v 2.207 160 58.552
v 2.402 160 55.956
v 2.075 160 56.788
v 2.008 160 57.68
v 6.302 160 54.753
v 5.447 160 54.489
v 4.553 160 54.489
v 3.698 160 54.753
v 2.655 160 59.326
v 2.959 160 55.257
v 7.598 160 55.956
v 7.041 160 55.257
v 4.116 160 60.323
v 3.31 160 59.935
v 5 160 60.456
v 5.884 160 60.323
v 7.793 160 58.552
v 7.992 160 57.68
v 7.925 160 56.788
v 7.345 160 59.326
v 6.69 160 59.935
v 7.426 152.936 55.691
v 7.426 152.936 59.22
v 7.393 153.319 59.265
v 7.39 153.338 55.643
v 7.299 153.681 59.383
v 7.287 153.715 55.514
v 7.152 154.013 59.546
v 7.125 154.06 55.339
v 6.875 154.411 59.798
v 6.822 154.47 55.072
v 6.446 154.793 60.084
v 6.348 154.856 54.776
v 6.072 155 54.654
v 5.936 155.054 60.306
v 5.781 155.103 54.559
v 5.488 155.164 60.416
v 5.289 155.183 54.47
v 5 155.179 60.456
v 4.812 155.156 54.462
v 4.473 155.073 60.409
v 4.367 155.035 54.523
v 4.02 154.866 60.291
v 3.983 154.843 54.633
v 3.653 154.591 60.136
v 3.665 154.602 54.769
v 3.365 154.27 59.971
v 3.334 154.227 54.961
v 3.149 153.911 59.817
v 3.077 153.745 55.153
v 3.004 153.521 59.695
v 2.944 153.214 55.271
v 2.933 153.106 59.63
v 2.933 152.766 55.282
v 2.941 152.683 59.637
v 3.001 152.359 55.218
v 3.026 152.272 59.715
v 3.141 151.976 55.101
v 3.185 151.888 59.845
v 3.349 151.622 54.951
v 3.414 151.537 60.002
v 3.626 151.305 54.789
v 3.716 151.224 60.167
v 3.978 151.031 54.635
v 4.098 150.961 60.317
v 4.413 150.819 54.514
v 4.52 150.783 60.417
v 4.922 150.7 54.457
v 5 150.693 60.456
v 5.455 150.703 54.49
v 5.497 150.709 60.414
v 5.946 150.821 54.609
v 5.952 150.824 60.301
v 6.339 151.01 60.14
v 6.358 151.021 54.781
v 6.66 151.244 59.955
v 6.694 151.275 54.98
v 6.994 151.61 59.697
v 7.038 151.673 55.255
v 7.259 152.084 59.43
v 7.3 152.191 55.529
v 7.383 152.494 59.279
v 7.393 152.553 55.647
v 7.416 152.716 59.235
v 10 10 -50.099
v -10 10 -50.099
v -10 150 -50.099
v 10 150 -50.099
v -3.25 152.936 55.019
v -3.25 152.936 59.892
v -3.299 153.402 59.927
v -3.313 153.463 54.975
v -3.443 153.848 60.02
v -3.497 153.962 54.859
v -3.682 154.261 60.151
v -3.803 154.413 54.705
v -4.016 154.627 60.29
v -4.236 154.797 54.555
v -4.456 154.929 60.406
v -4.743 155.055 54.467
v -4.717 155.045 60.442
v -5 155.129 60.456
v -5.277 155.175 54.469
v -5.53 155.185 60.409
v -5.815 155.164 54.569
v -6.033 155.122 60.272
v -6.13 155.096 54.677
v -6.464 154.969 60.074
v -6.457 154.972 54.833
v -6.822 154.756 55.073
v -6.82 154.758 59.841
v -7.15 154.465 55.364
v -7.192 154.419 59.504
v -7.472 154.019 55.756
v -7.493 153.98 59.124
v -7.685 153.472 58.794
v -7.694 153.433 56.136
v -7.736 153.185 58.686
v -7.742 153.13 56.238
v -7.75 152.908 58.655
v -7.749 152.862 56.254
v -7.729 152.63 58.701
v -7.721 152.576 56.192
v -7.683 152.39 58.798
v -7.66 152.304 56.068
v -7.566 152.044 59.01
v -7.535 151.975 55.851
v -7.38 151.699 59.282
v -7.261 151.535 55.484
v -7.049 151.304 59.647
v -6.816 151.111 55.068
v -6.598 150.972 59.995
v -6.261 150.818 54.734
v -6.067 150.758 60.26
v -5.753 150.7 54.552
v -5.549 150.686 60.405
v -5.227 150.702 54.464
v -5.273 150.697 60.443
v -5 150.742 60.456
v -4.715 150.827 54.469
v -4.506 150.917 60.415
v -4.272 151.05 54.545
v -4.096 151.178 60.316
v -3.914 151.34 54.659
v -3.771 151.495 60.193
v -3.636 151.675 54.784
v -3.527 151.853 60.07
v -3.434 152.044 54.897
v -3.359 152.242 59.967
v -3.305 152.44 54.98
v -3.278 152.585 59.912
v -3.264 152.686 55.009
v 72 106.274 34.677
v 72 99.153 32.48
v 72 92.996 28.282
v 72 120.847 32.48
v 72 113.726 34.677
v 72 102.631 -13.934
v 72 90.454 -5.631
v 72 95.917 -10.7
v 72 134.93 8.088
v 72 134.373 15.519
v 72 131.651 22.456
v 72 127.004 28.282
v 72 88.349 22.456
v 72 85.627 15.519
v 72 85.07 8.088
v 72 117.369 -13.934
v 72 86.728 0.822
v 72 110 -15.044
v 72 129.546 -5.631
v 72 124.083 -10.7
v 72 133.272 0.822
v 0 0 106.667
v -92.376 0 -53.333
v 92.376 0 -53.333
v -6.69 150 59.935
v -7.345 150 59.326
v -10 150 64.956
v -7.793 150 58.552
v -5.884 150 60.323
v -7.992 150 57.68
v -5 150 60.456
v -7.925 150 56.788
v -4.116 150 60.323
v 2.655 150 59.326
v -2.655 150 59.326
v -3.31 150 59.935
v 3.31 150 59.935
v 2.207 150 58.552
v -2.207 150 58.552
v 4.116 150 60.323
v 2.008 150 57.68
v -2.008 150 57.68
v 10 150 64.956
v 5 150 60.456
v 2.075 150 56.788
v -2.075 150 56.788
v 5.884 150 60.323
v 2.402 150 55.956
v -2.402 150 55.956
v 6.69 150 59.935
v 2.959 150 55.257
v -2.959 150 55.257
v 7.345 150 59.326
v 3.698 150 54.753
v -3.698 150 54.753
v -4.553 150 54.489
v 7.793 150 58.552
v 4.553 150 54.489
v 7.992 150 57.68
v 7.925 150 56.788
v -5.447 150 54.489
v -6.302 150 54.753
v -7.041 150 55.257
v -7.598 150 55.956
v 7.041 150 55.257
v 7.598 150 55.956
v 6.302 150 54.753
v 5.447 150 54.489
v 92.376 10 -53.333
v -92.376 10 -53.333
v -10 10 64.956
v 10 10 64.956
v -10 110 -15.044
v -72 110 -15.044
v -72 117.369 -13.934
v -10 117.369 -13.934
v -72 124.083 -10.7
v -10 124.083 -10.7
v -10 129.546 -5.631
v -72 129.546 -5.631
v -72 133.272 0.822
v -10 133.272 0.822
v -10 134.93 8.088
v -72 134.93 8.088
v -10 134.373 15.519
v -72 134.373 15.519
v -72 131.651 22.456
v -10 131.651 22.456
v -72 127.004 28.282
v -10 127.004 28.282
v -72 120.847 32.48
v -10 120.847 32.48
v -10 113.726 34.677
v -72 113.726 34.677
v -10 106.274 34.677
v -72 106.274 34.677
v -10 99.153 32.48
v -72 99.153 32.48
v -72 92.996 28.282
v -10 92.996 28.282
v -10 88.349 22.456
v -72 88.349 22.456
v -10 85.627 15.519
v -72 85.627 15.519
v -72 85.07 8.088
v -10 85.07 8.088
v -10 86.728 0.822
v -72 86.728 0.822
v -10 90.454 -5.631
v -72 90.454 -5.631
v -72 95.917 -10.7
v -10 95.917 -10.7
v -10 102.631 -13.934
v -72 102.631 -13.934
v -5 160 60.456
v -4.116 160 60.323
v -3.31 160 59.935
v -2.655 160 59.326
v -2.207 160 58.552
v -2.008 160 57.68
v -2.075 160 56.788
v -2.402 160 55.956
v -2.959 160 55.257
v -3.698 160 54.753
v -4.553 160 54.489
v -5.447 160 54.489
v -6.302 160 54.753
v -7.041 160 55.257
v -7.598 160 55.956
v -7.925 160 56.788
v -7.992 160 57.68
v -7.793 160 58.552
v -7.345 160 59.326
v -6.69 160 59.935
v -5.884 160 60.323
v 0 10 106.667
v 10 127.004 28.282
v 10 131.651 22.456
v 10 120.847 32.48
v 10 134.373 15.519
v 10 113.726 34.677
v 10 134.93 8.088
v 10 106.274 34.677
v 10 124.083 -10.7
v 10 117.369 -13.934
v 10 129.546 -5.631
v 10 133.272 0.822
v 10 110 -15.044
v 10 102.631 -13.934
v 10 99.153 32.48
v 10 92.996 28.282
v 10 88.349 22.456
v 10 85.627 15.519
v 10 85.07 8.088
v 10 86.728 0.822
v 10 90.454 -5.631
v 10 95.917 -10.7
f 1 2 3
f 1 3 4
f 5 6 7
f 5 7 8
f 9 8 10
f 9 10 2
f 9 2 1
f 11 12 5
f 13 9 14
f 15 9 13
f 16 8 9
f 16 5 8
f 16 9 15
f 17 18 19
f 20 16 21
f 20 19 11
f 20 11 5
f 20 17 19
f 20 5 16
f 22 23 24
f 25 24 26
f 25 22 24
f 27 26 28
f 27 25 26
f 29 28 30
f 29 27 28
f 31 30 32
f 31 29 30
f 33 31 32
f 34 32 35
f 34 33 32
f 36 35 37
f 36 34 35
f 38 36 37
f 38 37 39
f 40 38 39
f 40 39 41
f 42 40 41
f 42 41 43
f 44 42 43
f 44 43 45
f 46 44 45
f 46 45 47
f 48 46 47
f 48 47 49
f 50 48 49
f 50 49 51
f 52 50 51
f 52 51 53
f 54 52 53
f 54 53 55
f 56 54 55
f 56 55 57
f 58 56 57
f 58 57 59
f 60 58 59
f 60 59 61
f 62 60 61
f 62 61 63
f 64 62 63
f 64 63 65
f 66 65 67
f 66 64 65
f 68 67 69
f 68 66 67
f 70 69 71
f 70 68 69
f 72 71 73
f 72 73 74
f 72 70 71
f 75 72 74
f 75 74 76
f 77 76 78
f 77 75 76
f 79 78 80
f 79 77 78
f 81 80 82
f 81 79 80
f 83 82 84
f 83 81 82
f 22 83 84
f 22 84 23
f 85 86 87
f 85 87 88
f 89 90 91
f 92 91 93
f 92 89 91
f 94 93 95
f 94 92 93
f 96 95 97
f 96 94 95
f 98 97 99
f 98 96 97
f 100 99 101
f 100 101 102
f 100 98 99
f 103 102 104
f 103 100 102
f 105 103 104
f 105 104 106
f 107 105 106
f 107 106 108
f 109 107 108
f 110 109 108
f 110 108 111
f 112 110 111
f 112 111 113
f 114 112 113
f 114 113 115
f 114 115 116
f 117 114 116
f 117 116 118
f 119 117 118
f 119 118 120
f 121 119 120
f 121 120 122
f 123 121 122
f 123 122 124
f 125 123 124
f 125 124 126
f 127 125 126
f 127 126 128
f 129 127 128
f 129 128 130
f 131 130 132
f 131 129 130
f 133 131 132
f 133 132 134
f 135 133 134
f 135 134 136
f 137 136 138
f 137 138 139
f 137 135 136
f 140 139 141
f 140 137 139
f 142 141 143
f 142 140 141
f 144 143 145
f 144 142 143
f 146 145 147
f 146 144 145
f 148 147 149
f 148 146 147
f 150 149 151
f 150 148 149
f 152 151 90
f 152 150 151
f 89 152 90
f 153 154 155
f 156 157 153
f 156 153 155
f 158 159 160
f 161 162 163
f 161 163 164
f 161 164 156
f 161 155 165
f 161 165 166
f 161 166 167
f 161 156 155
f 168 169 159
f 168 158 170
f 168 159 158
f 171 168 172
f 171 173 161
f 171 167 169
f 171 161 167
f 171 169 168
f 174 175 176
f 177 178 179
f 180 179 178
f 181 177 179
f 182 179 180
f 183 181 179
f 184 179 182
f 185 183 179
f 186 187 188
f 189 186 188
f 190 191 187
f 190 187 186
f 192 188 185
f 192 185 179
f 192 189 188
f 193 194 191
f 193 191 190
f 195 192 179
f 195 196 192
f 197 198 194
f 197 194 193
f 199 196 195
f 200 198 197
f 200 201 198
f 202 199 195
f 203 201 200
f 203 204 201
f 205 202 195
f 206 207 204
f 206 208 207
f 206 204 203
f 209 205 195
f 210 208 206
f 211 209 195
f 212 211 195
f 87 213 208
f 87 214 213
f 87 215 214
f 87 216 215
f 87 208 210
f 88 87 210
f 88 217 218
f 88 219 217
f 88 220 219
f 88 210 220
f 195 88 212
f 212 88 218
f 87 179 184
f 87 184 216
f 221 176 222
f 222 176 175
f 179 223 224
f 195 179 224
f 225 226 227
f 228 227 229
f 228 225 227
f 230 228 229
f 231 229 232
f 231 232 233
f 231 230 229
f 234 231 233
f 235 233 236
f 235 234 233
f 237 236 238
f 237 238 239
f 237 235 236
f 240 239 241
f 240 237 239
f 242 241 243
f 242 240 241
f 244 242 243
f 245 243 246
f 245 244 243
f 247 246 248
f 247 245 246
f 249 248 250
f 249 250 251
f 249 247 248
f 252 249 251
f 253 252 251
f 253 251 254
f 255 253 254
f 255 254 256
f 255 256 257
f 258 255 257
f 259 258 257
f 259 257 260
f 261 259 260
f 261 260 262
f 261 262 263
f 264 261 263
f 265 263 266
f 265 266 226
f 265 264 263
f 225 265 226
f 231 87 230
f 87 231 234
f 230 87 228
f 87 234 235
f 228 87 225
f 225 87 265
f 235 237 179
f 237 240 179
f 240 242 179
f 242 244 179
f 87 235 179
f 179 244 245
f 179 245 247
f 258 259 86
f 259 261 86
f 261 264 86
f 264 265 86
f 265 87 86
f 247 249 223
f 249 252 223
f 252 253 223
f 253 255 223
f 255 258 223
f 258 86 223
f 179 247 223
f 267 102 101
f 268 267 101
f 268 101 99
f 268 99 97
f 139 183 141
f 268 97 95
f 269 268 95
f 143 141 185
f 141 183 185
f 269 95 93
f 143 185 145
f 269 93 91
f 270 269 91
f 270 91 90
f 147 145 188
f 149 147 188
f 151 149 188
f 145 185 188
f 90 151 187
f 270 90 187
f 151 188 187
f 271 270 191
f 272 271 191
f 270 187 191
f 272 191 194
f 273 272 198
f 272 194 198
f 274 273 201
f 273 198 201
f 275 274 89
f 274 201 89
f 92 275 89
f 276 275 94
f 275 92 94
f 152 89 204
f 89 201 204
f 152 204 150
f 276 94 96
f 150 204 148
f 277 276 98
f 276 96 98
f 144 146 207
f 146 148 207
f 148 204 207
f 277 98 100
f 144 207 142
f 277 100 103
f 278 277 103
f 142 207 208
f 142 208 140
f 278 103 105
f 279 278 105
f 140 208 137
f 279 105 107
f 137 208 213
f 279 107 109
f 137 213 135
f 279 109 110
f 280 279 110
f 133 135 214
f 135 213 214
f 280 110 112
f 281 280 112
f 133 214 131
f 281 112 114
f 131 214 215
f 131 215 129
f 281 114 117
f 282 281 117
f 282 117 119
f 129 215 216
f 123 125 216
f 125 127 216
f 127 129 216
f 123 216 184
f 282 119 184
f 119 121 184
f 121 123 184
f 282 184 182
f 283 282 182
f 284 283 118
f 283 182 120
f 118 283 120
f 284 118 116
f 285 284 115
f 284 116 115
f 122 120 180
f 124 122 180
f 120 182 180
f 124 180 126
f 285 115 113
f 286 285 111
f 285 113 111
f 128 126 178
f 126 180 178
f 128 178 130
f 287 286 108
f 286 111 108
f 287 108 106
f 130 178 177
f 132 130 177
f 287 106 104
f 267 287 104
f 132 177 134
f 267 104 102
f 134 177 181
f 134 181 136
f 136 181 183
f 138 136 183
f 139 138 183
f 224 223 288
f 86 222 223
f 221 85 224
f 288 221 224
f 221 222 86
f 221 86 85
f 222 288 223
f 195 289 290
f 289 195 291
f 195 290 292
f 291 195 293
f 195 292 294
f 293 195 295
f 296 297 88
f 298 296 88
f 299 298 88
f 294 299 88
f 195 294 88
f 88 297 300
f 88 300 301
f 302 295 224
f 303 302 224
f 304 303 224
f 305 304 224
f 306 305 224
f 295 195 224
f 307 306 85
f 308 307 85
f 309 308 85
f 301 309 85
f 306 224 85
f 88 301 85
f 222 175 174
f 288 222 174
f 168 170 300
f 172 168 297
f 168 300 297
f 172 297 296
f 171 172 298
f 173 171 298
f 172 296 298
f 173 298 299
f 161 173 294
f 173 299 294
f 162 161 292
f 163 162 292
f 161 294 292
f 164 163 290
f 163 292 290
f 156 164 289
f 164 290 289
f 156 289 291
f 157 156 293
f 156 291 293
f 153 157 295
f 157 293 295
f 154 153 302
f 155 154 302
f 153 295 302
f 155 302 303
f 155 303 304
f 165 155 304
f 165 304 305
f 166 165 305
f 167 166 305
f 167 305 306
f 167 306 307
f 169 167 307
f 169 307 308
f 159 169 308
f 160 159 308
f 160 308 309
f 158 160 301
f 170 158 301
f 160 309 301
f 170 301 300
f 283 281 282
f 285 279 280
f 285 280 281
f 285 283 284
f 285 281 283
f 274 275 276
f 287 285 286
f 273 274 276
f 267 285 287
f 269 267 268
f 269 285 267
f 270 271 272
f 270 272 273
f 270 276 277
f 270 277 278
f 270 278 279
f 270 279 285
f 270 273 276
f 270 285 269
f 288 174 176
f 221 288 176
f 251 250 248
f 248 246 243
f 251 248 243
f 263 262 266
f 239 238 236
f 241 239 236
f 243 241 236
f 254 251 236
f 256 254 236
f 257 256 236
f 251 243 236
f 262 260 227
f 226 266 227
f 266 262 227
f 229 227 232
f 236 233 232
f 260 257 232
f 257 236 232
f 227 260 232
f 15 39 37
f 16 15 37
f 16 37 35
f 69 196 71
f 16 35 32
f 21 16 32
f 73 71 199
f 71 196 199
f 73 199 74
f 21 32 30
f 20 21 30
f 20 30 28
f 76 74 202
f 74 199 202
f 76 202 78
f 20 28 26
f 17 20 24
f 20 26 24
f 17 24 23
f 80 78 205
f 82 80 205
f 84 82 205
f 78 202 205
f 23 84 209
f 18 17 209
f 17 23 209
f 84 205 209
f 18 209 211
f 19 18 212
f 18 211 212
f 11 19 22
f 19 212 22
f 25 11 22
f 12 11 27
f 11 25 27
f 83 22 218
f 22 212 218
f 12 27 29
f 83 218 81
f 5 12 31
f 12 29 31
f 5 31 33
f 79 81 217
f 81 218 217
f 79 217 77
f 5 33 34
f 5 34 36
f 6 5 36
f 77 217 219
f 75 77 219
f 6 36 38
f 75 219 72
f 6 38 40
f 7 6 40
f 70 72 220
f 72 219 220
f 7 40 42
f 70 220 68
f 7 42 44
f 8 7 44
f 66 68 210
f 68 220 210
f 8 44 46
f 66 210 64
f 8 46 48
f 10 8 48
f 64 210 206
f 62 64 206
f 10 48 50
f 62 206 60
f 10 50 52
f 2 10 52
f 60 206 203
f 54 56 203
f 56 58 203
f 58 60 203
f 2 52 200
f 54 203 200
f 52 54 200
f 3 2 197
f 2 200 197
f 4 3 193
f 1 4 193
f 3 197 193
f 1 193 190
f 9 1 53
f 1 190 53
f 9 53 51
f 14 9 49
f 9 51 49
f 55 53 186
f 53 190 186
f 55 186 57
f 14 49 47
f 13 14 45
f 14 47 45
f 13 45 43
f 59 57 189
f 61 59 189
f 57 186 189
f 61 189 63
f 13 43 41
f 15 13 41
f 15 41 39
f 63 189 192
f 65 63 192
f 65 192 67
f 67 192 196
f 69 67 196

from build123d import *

# Parameters (mm, degrees)
BOSS_EXTRUDE1_DEPTH    = 10
SKETCH6_W              = 20
SKETCH6_H              = 64.955790415
SKETCH6_H_2            = 50.098640903
BOSS_EXTRUDE4_DEPTH    = 140
SKETCH7_R              = 25
BOSS_EXTRUDE5_DEPTH    = 62
SKETCH12_R             = 3
BOSS_EXTRUDE6_DEPTH    = 10
CUT_EXTRUDE1_START     = 54.455790306
CUT_EXTRUDE1_OUTLINE_R = 2.25
CUT_EXTRUDE1_DEPTH     = 6.544209694


with BuildPart() as part:
    # Sketch1 → Boss-Extrude1 (new body)
    with BuildSketch(Plane(origin=(0, 0, 0), x_dir=(1, 0, 0), z_dir=(0, 1, 0))):
        Polygon((0, -106.666666667), (92.37604307, 53.333333333), (-92.37604307, 53.333333333), align=None)
    extrude(amount=BOSS_EXTRUDE1_DEPTH)

    # Sketch6 → Boss-Extrude4 (add)
    with BuildSketch(Plane(origin=(0, 10, 0), x_dir=(1, 0, 0), z_dir=(0, 1, 0))):
        with Locations((0, -32.477895208)):
            Rectangle(SKETCH6_W, SKETCH6_H)
        with Locations((0, 25.049320452)):
            Rectangle(SKETCH6_W, SKETCH6_H_2)
    extrude(amount=BOSS_EXTRUDE4_DEPTH)

    # Sketch7 → Boss-Extrude5 (add)
    with BuildSketch(Plane(origin=(10, 0, 0), x_dir=(0, 0, -1), z_dir=(1, 0, 0))):
        with Locations((-9.955790415, 110)):
            Circle(SKETCH7_R)
    boss_extrude5 = extrude(amount=BOSS_EXTRUDE5_DEPTH)

    # Mirror1: Boss-Extrude5 across plane
    add(boss_extrude5.mirror(Plane(origin=(0, 0, 0), x_dir=(0, 0, 1), z_dir=(1, 0, 0))))

    # Sketch12 → Boss-Extrude6 (add)
    with BuildSketch(Plane(origin=(0, 150, 0), x_dir=(1, 0, 0), z_dir=(0, 1, 0))):
        with Locations(Location((5, -57.455790415, 0), (0, 0, 270))):
            Circle(SKETCH12_R)
        with Locations(Location((-5, -57.455790415, 0), (0, 0, 270))):
            Circle(SKETCH12_R)
    extrude(amount=BOSS_EXTRUDE6_DEPTH)

    # Cut-Extrude1: read off the stored shape, not the designer's step
    # Cut-Extrude1 outline → Cut-Extrude1 (cut)
    with BuildSketch(Plane.XY.offset(CUT_EXTRUDE1_START)):
        with Locations((-5.5, 152.935681358)):
            Circle(CUT_EXTRUDE1_OUTLINE_R)
        with Locations((5.176294741, 152.935681358)):
            Circle(CUT_EXTRUDE1_OUTLINE_R)
    extrude(amount=CUT_EXTRUDE1_DEPTH, mode=Mode.SUBTRACT)


solid = part.part
